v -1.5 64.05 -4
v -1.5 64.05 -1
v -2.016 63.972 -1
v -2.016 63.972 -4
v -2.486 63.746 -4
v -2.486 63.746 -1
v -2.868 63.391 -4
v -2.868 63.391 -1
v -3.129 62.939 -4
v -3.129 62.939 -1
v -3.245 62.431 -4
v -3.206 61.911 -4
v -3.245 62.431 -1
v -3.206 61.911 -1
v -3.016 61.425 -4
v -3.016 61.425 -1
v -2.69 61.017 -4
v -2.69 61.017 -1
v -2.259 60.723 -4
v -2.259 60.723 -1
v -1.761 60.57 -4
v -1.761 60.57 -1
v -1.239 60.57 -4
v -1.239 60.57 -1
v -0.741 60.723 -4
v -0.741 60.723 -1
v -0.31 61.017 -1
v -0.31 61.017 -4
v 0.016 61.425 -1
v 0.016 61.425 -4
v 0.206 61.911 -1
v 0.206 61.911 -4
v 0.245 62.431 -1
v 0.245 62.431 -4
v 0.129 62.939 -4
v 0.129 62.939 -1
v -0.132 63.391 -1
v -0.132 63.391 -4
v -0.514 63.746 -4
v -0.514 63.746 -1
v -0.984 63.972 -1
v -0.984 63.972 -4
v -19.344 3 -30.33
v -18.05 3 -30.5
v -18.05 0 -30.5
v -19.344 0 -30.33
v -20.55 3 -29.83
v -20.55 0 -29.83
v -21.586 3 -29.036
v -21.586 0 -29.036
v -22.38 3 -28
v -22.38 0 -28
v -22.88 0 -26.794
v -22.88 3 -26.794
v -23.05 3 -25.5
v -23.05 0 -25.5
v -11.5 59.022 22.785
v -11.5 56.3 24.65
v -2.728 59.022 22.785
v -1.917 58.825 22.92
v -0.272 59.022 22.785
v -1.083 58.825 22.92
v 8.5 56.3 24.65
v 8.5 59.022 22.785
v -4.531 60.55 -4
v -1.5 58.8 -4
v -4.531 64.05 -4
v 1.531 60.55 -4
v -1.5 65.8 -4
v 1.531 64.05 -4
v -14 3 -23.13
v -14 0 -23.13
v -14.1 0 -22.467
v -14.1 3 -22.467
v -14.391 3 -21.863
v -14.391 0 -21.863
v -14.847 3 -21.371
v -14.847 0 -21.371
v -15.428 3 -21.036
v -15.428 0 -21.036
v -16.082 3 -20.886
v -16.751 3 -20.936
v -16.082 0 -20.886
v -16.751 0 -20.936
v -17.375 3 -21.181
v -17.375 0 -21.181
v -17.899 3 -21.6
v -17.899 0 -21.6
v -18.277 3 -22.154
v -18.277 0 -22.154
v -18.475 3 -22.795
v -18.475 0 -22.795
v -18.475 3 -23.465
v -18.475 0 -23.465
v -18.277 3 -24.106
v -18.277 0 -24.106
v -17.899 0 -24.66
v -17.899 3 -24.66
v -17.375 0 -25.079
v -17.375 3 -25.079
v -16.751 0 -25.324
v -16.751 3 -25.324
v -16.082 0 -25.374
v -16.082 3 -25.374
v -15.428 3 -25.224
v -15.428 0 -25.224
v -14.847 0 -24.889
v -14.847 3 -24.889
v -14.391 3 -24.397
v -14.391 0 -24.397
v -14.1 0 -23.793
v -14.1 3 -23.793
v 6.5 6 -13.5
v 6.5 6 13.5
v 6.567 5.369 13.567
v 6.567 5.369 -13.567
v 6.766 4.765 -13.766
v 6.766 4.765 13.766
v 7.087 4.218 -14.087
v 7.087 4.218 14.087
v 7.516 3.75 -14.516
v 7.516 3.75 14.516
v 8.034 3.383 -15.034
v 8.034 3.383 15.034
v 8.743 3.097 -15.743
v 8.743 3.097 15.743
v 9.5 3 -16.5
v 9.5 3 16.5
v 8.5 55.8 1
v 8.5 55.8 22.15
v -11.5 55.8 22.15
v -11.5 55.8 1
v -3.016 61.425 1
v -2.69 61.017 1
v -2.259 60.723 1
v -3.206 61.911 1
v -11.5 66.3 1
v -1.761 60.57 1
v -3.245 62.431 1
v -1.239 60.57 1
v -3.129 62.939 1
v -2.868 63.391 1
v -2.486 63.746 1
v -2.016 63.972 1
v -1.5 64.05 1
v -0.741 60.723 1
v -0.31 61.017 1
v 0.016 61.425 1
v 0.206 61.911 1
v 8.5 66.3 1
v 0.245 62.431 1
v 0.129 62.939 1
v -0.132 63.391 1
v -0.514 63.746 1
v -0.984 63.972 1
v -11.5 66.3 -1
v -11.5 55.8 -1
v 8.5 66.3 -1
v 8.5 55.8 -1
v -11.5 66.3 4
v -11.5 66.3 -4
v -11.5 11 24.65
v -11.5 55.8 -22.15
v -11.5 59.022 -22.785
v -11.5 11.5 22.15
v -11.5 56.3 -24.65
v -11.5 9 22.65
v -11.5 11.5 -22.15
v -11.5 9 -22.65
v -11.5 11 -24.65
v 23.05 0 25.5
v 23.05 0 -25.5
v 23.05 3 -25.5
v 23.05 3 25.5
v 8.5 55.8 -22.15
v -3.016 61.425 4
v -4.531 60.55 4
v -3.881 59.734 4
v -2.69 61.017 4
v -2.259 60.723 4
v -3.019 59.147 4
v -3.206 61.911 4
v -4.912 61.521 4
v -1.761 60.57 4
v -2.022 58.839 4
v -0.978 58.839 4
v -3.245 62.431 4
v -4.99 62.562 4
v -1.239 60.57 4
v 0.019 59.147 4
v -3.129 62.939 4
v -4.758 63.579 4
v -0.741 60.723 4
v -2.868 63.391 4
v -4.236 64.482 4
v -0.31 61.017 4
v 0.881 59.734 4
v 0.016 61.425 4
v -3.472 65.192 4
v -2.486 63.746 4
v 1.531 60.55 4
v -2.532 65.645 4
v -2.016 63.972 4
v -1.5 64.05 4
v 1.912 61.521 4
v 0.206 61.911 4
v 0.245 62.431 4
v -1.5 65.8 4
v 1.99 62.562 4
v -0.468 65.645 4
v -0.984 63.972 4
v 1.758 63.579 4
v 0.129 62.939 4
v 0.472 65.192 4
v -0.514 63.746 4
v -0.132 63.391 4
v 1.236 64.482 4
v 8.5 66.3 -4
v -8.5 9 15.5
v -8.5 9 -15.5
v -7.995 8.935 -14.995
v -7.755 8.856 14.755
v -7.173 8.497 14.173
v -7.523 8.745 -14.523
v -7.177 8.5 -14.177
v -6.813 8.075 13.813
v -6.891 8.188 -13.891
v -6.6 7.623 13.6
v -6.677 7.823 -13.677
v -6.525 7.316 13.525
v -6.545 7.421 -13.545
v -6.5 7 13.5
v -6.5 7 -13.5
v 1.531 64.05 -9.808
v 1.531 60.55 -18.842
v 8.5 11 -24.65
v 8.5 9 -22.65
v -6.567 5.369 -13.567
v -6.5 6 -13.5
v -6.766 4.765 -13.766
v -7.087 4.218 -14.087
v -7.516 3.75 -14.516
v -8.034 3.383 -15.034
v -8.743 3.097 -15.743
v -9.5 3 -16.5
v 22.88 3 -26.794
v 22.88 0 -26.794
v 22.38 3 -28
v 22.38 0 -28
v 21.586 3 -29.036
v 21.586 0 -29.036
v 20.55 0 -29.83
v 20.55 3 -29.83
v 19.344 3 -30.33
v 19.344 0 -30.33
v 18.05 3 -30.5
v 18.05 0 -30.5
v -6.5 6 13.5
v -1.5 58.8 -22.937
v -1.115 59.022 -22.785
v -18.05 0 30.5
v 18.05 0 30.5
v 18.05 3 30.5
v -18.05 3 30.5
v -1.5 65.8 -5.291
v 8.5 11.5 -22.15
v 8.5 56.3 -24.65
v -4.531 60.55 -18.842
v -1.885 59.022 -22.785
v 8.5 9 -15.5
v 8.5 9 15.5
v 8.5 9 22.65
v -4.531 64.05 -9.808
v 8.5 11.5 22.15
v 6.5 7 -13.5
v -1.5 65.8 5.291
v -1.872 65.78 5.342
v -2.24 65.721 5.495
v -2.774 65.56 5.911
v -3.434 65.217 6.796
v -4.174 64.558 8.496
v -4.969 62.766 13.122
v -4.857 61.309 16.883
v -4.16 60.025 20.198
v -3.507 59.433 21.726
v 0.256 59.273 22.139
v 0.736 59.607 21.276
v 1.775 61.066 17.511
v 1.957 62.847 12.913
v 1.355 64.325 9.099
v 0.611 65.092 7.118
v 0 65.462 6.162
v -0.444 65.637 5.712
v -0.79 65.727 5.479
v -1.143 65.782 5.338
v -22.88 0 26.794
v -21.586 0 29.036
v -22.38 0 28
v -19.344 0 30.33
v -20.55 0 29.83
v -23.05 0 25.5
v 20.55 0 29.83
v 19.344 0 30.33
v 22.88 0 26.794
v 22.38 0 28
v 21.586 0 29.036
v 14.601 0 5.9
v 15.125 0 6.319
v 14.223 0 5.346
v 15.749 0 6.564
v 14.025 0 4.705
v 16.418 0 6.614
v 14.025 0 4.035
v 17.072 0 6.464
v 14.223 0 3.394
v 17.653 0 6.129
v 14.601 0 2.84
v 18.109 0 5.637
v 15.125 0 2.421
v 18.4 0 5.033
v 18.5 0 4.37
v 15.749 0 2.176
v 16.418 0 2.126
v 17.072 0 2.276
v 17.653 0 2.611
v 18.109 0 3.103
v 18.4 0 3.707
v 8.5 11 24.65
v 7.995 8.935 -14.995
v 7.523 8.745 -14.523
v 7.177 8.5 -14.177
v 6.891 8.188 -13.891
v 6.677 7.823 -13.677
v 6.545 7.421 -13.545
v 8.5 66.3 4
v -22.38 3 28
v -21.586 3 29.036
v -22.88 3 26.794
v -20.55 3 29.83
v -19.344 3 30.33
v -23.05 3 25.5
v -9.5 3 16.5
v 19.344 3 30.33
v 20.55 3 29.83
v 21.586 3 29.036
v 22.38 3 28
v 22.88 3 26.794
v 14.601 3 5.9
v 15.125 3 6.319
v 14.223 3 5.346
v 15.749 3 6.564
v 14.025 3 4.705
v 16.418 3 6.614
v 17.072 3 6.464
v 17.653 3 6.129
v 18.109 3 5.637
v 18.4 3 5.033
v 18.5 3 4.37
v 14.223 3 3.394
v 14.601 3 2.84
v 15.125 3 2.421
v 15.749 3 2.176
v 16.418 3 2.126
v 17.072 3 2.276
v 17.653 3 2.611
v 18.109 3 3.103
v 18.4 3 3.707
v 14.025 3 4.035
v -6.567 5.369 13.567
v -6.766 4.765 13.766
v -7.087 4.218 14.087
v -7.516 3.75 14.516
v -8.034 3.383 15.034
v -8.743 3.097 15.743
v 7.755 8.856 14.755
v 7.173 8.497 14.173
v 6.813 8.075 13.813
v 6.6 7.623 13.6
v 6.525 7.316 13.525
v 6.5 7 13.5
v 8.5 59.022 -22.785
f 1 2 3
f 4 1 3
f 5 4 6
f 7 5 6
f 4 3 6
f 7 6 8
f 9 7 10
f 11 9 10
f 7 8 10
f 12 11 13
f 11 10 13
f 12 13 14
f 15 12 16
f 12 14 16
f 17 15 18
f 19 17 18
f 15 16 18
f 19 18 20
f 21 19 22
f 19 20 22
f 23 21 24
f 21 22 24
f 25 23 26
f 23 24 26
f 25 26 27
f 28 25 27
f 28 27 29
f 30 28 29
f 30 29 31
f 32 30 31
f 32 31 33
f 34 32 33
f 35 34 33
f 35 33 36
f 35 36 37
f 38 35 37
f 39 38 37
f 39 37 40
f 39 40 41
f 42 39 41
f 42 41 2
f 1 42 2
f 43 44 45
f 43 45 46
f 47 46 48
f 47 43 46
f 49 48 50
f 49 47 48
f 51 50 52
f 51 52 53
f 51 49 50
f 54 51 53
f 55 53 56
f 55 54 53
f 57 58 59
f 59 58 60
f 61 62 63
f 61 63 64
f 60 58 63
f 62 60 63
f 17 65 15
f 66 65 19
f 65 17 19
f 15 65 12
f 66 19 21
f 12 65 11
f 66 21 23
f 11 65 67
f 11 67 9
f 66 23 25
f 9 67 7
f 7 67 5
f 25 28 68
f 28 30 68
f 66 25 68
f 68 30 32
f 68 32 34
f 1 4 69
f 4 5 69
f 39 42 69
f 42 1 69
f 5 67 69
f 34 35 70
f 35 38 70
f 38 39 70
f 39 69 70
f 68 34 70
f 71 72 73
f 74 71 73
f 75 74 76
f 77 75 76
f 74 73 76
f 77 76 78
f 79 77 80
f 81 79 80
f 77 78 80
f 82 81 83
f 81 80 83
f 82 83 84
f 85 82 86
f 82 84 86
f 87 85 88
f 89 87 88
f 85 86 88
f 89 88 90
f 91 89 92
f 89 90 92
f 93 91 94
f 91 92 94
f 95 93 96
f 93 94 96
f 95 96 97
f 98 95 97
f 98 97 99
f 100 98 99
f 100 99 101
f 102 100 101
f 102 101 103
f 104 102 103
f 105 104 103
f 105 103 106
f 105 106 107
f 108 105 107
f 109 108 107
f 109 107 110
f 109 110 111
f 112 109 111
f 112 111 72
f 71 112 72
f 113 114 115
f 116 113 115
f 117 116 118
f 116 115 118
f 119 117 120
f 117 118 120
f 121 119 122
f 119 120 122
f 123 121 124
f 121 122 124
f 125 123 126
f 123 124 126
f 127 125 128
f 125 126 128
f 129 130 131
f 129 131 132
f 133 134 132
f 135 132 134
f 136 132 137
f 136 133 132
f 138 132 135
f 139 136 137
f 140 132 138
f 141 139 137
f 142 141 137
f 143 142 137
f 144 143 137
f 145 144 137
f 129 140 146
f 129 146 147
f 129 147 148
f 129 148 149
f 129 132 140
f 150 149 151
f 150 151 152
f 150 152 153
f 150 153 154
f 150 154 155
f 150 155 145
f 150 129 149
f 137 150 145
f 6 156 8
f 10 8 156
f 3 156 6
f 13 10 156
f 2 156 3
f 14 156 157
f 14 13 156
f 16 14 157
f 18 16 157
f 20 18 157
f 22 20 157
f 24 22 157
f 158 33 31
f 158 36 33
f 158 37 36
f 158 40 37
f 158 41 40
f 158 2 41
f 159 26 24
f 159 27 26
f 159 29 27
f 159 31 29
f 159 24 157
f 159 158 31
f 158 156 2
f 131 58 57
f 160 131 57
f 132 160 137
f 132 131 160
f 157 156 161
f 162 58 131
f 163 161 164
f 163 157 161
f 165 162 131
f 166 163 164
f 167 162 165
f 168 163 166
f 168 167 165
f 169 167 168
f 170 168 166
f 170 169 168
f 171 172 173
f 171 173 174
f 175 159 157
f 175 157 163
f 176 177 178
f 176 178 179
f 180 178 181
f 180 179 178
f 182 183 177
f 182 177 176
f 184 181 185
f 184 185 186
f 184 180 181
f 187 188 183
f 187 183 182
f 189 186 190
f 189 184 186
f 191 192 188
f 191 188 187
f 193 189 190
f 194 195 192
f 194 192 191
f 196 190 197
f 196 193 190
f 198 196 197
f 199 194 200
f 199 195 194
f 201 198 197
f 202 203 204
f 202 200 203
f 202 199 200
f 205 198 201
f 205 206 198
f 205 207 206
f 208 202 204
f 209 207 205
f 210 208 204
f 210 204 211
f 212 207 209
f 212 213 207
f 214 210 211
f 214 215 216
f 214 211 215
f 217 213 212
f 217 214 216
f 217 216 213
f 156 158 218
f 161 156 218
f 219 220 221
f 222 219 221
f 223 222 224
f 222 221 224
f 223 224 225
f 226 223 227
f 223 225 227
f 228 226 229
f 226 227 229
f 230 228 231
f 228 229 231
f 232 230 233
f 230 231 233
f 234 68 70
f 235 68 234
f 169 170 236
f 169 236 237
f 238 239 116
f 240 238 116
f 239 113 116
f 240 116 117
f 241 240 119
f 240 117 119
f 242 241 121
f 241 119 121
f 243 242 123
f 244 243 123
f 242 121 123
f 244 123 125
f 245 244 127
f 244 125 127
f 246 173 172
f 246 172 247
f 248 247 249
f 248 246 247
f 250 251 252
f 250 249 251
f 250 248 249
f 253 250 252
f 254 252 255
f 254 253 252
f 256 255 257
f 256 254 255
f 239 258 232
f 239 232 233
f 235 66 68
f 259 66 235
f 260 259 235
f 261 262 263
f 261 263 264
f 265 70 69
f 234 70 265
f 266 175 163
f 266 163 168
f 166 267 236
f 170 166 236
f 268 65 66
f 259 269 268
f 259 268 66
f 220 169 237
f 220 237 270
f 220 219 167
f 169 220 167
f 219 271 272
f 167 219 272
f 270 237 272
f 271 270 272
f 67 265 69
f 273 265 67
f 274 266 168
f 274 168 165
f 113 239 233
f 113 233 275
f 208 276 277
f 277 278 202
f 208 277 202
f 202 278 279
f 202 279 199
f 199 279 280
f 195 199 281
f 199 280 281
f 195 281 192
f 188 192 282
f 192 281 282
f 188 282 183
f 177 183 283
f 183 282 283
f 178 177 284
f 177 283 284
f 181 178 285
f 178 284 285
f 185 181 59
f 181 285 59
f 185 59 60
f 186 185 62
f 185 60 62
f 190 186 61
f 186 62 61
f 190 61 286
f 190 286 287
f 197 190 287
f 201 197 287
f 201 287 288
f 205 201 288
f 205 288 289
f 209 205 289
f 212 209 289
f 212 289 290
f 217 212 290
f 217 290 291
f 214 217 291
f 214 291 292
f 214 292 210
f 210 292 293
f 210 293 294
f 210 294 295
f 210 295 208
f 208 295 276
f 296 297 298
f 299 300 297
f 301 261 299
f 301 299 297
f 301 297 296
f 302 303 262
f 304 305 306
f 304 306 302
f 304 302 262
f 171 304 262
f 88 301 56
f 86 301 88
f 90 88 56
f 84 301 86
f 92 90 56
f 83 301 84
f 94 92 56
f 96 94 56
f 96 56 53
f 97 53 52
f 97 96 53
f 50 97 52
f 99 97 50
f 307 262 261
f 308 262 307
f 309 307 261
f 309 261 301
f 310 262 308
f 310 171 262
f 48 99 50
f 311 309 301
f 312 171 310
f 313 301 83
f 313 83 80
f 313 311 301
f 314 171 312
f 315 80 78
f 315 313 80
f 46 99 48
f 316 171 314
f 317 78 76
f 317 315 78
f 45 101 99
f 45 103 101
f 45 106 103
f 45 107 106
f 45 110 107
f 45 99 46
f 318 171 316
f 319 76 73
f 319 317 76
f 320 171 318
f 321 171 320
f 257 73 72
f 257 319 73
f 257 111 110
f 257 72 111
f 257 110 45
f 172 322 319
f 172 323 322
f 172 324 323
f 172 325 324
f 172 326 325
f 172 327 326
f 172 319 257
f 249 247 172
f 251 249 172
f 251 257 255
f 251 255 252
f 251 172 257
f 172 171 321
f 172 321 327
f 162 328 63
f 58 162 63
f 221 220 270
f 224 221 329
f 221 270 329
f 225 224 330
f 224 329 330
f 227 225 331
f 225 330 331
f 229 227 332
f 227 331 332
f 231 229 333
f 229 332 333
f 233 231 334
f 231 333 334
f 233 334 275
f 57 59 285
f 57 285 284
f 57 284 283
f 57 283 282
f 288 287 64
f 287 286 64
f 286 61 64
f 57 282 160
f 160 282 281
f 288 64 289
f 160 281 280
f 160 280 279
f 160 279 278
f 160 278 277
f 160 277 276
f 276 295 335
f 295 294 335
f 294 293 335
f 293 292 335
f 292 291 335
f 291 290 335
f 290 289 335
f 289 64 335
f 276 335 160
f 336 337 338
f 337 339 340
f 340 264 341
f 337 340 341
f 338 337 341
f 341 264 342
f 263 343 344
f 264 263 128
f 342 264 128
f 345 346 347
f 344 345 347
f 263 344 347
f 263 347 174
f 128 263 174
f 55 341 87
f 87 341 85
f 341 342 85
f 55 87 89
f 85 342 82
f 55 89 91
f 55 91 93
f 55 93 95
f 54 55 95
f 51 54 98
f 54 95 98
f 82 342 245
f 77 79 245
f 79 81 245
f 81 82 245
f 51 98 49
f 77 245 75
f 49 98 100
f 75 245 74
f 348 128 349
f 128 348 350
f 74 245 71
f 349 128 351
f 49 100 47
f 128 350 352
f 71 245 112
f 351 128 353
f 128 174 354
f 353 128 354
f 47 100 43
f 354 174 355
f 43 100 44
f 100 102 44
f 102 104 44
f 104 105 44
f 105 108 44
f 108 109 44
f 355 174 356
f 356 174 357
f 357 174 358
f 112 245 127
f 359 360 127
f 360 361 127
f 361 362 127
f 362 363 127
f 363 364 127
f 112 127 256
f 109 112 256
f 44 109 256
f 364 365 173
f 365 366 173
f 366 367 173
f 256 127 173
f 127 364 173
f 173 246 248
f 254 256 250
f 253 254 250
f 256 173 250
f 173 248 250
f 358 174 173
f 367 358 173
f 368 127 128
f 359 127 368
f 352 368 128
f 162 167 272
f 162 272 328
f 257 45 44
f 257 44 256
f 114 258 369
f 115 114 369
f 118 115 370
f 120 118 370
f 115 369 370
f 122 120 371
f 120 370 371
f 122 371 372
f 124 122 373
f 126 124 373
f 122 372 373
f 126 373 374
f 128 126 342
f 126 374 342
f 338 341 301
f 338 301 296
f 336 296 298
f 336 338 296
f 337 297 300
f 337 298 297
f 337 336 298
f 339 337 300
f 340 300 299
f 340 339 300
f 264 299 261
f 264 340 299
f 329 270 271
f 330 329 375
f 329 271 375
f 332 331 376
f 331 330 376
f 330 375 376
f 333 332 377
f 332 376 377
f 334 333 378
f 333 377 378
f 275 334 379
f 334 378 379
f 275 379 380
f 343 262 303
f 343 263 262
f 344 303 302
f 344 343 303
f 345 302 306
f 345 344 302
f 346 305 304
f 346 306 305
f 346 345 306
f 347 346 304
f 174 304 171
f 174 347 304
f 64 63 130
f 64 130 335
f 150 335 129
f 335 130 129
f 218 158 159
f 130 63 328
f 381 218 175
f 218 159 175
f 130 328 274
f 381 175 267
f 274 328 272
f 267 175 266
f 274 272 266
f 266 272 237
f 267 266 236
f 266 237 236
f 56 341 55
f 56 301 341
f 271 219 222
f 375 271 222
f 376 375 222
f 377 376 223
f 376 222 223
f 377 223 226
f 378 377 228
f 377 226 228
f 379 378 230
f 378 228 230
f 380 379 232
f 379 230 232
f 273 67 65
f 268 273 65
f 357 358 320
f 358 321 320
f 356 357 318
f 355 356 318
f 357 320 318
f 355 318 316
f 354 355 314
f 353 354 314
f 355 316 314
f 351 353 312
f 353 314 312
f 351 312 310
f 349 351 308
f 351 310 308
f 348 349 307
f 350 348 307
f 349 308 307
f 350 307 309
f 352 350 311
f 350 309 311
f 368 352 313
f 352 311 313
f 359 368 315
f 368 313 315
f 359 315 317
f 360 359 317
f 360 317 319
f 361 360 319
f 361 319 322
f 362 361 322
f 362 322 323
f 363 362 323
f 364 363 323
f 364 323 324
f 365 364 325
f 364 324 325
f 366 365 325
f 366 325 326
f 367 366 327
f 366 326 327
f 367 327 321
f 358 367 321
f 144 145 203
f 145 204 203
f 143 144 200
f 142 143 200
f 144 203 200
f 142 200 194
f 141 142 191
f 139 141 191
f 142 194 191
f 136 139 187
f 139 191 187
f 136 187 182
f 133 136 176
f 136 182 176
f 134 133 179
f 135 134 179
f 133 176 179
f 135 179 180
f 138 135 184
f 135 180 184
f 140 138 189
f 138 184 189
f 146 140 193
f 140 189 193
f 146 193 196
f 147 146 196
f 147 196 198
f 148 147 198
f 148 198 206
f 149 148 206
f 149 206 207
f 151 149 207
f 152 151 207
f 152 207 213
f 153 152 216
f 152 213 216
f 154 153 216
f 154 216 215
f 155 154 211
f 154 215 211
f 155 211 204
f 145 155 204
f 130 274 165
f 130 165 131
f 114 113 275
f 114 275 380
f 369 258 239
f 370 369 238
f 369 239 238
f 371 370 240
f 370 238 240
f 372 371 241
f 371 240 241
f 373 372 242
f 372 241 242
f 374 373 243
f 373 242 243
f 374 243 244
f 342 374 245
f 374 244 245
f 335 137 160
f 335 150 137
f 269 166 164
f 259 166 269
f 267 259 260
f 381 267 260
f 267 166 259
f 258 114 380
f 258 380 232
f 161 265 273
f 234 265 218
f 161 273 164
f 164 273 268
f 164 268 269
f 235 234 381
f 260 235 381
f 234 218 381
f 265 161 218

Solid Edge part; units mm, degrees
sketch "Sketch1" plane through (0, 0, 0) normal (0, -1, 0) x (1, 0, 0)
  circle A0 centre (16.25, 4.37) radius 2.25
  circle A1 centre (-16.25, -23.13) radius 2.25
  line L0 (-23.05, -30.5) -> (23.05, -30.5)
  line L1 (23.05, -30.5) -> (23.05, 30.5)
  line L2 (23.05, 30.5) -> (-23.05, 30.5)
  line L3 (-23.05, 30.5) -> (-23.05, -30.5)
  dimension "D1" = 61
  dimension "D2" = 4.5
  dimension "D3" = 27.5
  dimension "D4" = 32.5
  dimension "D5" = 26.13
  dimension "D6" = 6.8
  dimension "D7" = 6.8
extrude "Protrusion1" add sketch "Sketch1" against normal blind 3
fillet "Redondeo_2" radius 5 4 edges at (23.05, 1.5, 30.5) (-23.05, 1.5, 30.5) (23.05, 1.5, -30.5) (-23.05, 1.5, -30.5)
sketch "Sketch2" plane through (0, 3, 0) normal (0, 1, 0) x (-1, 0, 0)
  line L0 (-6.5, 13.5) -> (6.5, 13.5)
  line L1 (6.5, 13.5) -> (6.5, -13.5)
  line L2 (6.5, -13.5) -> (-6.5, -13.5)
  line L3 (-6.5, -13.5) -> (-6.5, 13.5)
extrude "ProtrusiónExtruida_4" add sketch "Sketch2" along normal blind 6
sketch "Sketch3" plane through (8.5, 6, 0) normal (1, 0, 0) x (0, 1, 0)
  line L0 (49.8, -22.15) -> (5.5, -22.15)
  line L1 (5.5, -22.15) -> (5.5, 22.15)
  line L2 (5.5, 22.15) -> (49.8, 22.15)
  line L3 (49.8, 22.15) -> (49.8, -22.15)
  line L4 (52.3, -24.65) -> (3, -24.65)
  line L5 (3, -24.65) -> (3, 24.65)
  line L6 (3, 24.65) -> (52.3, 24.65)
  line L7 (52.3, 24.65) -> (52.3, -24.65)
  dimension "D1" = 2.5
  dimension "D2" = 2.5
  dimension "D3" = 2.5
  dimension "D4" = 44.3
  dimension "D5" = 22.15
extrude "ProtrusiónExtruida_5" add sketch "Sketch3" against normal blind 20
sketch "Sketch4" plane through (8.5, 33.65, 0) normal (1, 0, 0) x (0, 1, 0)
  line L0 (29.65, -1) -> (19.65, -1)
  line L1 (19.65, -1) -> (19.65, 1)
  line L2 (19.65, 1) -> (29.65, 1)
  line L3 (29.65, 1) -> (29.65, -1)
  dimension "D1" = 2
  dimension "D2" = 10
extrude "VaciadoExtruido_1" cut sketch "Sketch4" against normal blind 43.1103
sketch "Sketch5" plane through (8.5, 33.65, 0) normal (1, 0, 0) x (0, 1, 0)
  line L0 (24.65, -24.65) -> (24.65, -1)
  line L1 (24.65, -1) -> (32.65, -1)
  line L2 (32.65, -1) -> (32.65, -4)
  line L3 (32.65, -4) -> (24.65, -24.65)
  line L4 (24.65, 1) -> (32.65, 1)
  line L5 (32.65, 1) -> (32.65, 4)
  line L6 (24.65, 24.65) -> (32.65, 4)
  line L7 (24.65, 24.65) -> (24.65, 1)
  dimension "D1" = 8
  dimension "D2" = 3
extrude "v_20" add sketch "Sketch5" against normal blind 20
sketch "Sketch6" plane through (-1.5, 33.65, 24.65) normal (0, 0, 1) x (0, 1, 0)
  circle A0 centre (28.65, 0) radius 1.75
  dimension "D1" = 10
  dimension "D2" = 4
extrude "VaciadoExtruido_2" cut sketch "Sketch6" against normal blind 71.0094
sketch "Sketch7" plane through (-1.5, 33.65, 24.65) normal (0, 0, 1) x (0, 1, 0)
  circle A0 centre (28.65, 0) radius 3.5
extrude "Cutout1" cut sketch "Sketch7" against normal up to vertex (20.65 mm away)
chamfer "Chaflán_2" distance 2 angle 45 4 edges at (-1.5, 58.3, 24.65) (-1.5, 9, 24.65) (-1.5, 58.3, -24.65) (-1.5, 9, -24.65)
sketch "Sketch8" plane through (-1.5, 33.65, -24.65) normal (0, 0, -1) x (0, -1, 0)
  line L0 (-32.15, 0) -> (-30.4, 3.0311)
  line L1 (-30.4, 3.0311) -> (-26.9, 3.0311)
  line L2 (-26.9, 3.0311) -> (-25.15, 0)
  line L3 (-25.15, 0) -> (-26.9, -3.0311)
  line L4 (-26.9, -3.0311) -> (-30.4, -3.0311)
  line L5 (-30.4, -3.0311) -> (-32.15, 0)
  dimension "D1" = 7
extrude "Cutout2" cut sketch "Sketch8" against normal up to vertex (20.65 mm away)
fillet "Redondeo_3" radius 3 4 edges at (6.5, 3, 0) (0, 3, 13.5) (0, 3, -13.5) (-6.5, 3, 0)
fillet "Redondeo_4" radius 2 4 edges at (0, 9, -13.5) (-6.5, 9, 0) (0, 9, 13.5) (6.5, 9, 0)
